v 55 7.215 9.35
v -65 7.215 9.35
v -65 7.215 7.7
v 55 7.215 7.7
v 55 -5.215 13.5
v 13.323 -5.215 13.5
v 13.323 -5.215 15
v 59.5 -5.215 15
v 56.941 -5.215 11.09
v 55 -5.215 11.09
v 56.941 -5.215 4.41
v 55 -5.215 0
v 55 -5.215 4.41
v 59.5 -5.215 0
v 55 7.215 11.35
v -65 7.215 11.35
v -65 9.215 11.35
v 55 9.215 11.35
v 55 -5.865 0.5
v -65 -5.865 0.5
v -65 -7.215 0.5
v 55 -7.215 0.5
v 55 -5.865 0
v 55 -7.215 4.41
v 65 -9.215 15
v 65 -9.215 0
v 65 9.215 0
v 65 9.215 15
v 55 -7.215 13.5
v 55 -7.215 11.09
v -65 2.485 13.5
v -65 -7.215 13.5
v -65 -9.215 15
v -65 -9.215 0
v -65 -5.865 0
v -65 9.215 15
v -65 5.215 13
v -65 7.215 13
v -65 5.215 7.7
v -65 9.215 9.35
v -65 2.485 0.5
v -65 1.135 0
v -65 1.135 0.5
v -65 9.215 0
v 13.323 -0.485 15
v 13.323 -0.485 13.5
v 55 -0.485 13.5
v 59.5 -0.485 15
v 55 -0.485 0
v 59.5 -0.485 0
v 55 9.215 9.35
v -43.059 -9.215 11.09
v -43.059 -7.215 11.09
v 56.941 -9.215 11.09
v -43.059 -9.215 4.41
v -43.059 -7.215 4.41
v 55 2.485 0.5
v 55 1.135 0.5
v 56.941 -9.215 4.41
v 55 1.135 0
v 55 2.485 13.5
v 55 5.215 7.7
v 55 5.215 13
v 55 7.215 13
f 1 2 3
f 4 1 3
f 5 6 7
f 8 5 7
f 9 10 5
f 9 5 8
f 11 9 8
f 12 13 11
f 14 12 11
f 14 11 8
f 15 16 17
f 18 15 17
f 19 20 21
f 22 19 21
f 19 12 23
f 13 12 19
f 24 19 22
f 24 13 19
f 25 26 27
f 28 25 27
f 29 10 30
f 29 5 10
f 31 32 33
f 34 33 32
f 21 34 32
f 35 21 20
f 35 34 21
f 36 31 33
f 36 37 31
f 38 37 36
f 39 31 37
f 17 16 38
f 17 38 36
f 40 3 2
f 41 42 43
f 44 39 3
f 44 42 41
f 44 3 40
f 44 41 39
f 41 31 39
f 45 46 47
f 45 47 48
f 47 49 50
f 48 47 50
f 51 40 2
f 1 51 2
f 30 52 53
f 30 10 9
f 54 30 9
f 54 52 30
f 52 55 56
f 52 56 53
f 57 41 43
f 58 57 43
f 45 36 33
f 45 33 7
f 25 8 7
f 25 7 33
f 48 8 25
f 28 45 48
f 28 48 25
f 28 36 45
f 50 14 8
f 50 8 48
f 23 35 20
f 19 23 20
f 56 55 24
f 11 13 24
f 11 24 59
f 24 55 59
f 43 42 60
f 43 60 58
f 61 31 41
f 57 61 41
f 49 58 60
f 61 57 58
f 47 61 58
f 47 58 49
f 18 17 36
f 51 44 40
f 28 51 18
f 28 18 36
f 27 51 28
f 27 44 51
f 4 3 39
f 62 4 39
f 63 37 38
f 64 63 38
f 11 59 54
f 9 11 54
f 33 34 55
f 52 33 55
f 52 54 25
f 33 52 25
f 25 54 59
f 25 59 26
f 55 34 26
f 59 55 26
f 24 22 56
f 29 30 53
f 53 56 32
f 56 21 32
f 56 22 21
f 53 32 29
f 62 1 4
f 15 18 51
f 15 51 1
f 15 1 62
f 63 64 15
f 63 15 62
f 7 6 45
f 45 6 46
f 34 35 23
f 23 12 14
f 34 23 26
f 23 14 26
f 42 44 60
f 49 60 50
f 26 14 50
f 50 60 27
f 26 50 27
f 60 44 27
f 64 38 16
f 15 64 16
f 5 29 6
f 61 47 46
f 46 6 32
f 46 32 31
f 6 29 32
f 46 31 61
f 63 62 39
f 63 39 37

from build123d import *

# Parameters (mm, degrees)
F0_W     = 130
F0_H     = 18.43
F0_W_2   = 46.176888
F0_H_2   = 4.73
F1_DEPTH = 15
F2_W     = 7
F2_H     = 0.5
F3_DEPTH = 120
F4_W     = 100
F4_H     = 6.68
F5_DEPTH = 5


with BuildPart() as f1:
    # F0 (on Top) → F1 (new body)
    with BuildSketch(Plane.XY):
        Rectangle(F0_W, F0_H)
        with Locations((36.411556, -2.85)):
            Rectangle(F0_W_2, F0_H_2, mode=Mode.SUBTRACT)
    extrude(amount=F1_DEPTH)

    # F2 (on face) → F3 (cut)
    with BuildSketch(Plane(origin=(-65, 0, 0), x_dir=(0, -1, 0), z_dir=(-1, 0, 0))):
        Polygon((7.215, 13.5), (-2.485, 13.5), (-2.485, 0.5), (-1.135, 0.5), (5.865, 0.5), (7.215, 0.5), align=None)
        with Locations((2.365, 0.25)):
            Rectangle(F2_W, F2_H)
        Polygon((-7.215, 11.35), (-9.215, 11.35), (-9.215, 9.35), (-7.215, 9.35), (-7.215, 7.7), (-5.215, 7.7), (-5.215, 13), (-7.215, 13), align=None)
    extrude(amount=-F3_DEPTH, mode=Mode.SUBTRACT)

    # F4 (on face) → F5 (cut)
    with BuildSketch(Plane.XZ.offset(9.215)):
        with Locations((6.941007, 7.75)):
            Rectangle(F4_W, F4_H)
    extrude(amount=-F5_DEPTH, mode=Mode.SUBTRACT)


solid = f1.part
